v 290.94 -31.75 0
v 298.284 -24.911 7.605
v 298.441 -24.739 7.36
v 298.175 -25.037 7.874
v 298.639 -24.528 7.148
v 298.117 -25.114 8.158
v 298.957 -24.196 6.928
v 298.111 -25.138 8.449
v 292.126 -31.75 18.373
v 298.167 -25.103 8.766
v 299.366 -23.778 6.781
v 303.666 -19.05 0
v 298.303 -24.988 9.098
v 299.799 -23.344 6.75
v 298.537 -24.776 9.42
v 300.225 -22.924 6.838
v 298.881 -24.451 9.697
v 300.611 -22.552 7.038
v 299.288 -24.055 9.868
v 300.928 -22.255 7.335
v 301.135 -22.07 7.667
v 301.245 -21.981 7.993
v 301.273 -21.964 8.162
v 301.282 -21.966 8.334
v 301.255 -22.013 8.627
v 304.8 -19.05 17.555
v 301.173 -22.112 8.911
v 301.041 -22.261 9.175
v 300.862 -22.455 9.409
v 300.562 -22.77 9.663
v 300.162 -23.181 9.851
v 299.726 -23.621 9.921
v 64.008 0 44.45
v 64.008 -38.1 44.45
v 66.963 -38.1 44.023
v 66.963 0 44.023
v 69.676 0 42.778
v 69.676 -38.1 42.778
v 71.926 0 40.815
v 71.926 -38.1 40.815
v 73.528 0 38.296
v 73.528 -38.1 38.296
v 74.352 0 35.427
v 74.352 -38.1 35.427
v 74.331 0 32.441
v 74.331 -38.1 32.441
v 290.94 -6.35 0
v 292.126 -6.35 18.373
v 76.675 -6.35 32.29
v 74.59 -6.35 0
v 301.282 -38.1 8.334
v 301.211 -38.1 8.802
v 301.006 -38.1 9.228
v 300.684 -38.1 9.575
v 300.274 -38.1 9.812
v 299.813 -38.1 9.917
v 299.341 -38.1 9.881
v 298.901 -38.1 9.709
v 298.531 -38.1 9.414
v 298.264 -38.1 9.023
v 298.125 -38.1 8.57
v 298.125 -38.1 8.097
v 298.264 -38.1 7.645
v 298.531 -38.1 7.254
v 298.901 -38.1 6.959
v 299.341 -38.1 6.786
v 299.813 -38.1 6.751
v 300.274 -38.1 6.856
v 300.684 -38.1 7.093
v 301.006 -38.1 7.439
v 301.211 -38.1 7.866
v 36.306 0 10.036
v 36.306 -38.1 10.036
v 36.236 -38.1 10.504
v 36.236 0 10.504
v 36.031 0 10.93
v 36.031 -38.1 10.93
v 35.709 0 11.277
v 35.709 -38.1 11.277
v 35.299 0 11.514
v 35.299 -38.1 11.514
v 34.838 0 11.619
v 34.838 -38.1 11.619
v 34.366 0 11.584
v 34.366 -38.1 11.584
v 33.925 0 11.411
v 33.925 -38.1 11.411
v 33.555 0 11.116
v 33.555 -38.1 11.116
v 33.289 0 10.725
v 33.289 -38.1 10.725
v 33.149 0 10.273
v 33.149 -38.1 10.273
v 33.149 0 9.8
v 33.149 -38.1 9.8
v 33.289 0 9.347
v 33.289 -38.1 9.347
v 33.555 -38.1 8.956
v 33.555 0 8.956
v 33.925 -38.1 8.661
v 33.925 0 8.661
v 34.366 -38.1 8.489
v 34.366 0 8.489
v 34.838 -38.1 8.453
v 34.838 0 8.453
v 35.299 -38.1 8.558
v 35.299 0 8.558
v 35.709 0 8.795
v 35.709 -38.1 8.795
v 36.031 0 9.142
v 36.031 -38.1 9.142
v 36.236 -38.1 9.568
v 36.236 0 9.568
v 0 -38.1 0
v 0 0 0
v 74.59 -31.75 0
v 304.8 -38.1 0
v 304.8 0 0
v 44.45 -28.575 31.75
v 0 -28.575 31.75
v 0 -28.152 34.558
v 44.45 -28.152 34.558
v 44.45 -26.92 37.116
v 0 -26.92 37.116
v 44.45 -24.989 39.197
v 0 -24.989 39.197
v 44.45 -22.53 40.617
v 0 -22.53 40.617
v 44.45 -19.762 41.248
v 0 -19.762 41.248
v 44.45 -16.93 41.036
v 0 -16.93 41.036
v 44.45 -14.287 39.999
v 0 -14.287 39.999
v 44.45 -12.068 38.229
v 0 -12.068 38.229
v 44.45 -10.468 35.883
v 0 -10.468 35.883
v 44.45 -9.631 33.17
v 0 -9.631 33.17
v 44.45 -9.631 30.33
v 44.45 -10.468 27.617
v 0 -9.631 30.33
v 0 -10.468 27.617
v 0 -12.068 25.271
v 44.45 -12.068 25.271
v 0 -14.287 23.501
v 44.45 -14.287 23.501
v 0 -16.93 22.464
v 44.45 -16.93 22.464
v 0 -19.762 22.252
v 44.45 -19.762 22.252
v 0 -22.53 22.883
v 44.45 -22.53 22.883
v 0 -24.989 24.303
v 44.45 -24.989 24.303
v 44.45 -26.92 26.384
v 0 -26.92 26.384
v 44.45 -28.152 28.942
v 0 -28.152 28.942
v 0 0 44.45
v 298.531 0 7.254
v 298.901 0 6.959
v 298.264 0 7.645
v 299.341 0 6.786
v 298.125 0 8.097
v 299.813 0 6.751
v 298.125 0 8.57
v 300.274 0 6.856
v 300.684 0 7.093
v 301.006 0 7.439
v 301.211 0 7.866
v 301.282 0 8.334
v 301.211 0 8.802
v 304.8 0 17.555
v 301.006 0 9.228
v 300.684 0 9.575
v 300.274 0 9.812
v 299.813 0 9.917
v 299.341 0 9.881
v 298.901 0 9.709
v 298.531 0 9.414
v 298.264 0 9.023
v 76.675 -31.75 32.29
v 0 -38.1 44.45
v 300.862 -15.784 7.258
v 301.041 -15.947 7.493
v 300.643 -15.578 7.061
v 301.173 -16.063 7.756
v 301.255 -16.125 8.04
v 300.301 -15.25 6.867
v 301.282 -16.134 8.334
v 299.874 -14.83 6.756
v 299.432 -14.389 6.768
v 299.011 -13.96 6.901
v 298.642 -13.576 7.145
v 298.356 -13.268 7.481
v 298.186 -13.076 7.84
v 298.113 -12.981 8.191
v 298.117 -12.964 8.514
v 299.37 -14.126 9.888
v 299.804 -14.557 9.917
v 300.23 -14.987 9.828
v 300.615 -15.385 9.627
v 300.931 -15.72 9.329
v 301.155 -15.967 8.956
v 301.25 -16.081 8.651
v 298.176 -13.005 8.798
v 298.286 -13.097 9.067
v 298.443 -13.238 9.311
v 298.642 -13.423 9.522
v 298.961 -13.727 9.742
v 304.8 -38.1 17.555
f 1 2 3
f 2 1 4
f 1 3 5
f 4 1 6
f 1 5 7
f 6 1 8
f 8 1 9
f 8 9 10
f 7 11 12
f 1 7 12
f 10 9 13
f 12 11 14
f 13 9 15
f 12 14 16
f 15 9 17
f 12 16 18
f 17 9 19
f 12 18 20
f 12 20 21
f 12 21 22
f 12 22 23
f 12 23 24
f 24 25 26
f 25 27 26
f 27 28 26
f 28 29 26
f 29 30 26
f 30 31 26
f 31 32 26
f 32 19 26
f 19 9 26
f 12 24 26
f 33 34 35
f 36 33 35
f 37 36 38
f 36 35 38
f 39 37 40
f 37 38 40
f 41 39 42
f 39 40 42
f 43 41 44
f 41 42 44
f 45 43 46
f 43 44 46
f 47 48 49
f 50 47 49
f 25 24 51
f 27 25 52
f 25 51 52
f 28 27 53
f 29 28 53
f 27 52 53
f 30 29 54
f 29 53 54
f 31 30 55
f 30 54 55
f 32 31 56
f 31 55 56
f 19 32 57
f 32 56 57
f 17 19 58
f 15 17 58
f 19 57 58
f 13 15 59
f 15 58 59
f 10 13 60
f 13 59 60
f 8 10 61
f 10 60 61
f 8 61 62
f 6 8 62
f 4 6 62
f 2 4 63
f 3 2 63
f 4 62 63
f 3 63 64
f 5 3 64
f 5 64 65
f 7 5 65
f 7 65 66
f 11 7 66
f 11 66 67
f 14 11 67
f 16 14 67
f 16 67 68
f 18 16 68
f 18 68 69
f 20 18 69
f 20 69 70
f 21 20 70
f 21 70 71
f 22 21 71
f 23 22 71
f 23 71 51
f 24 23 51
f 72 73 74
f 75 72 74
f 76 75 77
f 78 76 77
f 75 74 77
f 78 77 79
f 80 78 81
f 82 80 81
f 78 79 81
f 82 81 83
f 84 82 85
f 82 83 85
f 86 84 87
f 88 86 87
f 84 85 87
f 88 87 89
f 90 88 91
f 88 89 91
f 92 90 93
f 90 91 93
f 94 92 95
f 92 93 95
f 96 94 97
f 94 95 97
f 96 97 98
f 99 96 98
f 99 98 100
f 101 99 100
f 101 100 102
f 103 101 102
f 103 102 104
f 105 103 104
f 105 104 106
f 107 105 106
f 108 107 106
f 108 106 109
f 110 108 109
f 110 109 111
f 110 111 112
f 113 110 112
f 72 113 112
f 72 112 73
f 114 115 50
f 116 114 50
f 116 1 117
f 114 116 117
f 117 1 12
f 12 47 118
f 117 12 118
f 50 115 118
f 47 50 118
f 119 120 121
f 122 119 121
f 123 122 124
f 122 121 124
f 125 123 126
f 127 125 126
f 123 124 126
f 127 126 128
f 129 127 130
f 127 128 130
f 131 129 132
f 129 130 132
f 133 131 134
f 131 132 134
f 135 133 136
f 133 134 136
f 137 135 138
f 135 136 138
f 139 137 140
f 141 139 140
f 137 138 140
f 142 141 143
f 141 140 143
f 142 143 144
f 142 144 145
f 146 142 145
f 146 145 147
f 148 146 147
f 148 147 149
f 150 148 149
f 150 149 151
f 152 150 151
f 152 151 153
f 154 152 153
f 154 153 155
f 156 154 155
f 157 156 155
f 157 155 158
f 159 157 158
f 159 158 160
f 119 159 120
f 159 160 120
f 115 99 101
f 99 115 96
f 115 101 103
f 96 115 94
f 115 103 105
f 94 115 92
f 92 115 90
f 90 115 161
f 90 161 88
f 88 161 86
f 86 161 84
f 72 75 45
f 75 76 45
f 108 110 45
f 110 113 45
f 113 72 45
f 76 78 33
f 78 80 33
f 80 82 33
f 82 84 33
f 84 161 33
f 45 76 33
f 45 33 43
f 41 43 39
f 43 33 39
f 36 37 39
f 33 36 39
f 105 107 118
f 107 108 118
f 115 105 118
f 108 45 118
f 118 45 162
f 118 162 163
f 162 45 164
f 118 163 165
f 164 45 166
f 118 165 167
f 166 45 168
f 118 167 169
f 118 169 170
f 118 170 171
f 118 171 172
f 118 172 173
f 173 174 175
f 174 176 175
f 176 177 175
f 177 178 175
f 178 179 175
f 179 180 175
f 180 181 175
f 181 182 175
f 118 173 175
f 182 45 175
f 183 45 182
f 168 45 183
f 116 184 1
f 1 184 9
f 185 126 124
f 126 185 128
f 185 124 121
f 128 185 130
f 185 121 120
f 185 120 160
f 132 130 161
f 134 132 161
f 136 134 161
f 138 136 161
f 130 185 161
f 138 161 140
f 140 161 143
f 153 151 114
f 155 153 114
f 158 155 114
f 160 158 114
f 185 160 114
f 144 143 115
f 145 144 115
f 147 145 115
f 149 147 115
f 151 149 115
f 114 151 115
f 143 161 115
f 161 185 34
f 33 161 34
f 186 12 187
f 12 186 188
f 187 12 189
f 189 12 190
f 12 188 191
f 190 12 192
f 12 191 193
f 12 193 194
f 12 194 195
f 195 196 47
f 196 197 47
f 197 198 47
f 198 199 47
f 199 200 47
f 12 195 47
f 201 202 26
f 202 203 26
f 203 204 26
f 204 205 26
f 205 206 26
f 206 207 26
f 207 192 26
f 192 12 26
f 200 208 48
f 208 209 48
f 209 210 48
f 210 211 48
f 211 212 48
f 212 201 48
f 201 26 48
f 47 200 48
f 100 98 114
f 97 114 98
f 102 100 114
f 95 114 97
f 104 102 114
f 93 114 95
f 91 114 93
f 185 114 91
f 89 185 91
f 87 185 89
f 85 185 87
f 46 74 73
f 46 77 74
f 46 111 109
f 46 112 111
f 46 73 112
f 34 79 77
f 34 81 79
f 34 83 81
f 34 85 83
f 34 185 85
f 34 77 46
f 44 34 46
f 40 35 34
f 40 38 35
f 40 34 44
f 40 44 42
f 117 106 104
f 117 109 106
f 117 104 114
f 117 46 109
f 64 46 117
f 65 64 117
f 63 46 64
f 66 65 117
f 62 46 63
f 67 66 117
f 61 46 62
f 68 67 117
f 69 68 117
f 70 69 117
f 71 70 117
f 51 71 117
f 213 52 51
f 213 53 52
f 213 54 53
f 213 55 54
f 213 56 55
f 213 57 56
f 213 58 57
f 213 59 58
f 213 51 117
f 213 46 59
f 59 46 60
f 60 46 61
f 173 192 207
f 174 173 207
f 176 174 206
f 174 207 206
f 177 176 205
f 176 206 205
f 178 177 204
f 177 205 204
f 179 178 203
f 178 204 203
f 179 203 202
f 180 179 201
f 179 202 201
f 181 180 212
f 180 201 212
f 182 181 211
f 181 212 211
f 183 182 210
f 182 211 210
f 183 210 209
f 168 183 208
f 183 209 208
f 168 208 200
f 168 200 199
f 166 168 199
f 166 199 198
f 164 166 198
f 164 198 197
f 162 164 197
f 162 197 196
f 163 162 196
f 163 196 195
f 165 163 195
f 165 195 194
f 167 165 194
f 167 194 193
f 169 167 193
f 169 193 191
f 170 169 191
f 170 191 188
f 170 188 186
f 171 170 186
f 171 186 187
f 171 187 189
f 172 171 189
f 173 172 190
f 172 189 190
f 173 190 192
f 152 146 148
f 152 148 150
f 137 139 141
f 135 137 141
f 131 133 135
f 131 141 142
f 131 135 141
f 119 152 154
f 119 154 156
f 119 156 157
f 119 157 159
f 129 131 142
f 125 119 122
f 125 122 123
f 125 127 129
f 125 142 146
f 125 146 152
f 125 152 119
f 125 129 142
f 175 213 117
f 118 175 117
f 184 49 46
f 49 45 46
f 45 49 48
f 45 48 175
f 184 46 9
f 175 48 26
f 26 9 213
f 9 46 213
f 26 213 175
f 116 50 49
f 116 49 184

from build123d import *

# Parameters (mm, degrees)
F1_DEPTH  = 38.1
F2_R      = 9.525
F3_DEPTH  = 50.8
F5_R      = 9.525
F6_DEPTH  = 44.45
F8_DEPTH  = 46.482
F10_DEPTH = 38.1
F11_R     = 1.5875
F12_DEPTH = 57.15


with BuildPart() as f1:
    # F0 (on Front) → F1 (new body)
    with BuildSketch(Plane.XZ):
        Polygon((0, 63.5), (0, 0), (304.8, 0), (304.8, 19.05), align=None)
    extrude(amount=F1_DEPTH)

    # F2 (on face) → F3 (join)
    with BuildSketch(Plane(origin=(0, 0, 0), x_dir=(0, -1, 0), z_dir=(-1, 0, 0))):
        with Locations((19.05, 31.75)):
            Circle(F2_R)
    extrude(amount=-F3_DEPTH)

    # F5 (on face) → F6 (cut)
    with BuildSketch(Plane(origin=(0, 0, 0), x_dir=(0, -1, 0), z_dir=(-1, 0, 0))):
        with Locations((19.05, 31.75)):
            Circle(F5_R)
    extrude(amount=-F6_DEPTH, mode=Mode.SUBTRACT)

    # F7 (on face) → F8 (cut)
    with BuildSketch(Plane.XZ.offset(38.1)):
        with BuildLine():
            Line((0, 63.5), (0, 44.45))
            Line((0, 44.45), (64.008, 44.45))
            ThreePointArc((64.008, 44.45), (71.925847, 40.815134), (74.330844, 32.441333))
            Line((74.330844, 32.441333), (304.799885, 17.554725))
            Line((304.799885, 17.554725), (304.799885, 0))
            Line((304.799885, 0), (304.8, 0))
            Line((304.8, 0), (304.8, 19.05))
            Line((304.8, 19.05), (0, 63.5))
        make_face()
    extrude(amount=-F8_DEPTH, mode=Mode.SUBTRACT)

    # F9 (on face) → F10 (cut)
    with BuildSketch(Plane(origin=(2.395601, 0, 37.087822), x_dir=(0.99792, 0, -0.064458), z_dir=(0.064458, 0, 0.99792))):
        Polygon((303.034474, -19.05), (290.334474, -6.35), (74.434474, -6.35), (74.434474, -31.75), (290.334474, -31.75), align=None)
    extrude(amount=-F10_DEPTH, mode=Mode.SUBTRACT)

    # F11 (on face) → F12 (cut)
    with BuildSketch(Plane.XZ.offset(38.1)):
        with Locations((34.718972, 10.036203)):
            Circle(F11_R)
        with Locations((299.694479, 8.33375)):
            Circle(F11_R)
    extrude(amount=-F12_DEPTH, mode=Mode.SUBTRACT)


solid = f1.part
